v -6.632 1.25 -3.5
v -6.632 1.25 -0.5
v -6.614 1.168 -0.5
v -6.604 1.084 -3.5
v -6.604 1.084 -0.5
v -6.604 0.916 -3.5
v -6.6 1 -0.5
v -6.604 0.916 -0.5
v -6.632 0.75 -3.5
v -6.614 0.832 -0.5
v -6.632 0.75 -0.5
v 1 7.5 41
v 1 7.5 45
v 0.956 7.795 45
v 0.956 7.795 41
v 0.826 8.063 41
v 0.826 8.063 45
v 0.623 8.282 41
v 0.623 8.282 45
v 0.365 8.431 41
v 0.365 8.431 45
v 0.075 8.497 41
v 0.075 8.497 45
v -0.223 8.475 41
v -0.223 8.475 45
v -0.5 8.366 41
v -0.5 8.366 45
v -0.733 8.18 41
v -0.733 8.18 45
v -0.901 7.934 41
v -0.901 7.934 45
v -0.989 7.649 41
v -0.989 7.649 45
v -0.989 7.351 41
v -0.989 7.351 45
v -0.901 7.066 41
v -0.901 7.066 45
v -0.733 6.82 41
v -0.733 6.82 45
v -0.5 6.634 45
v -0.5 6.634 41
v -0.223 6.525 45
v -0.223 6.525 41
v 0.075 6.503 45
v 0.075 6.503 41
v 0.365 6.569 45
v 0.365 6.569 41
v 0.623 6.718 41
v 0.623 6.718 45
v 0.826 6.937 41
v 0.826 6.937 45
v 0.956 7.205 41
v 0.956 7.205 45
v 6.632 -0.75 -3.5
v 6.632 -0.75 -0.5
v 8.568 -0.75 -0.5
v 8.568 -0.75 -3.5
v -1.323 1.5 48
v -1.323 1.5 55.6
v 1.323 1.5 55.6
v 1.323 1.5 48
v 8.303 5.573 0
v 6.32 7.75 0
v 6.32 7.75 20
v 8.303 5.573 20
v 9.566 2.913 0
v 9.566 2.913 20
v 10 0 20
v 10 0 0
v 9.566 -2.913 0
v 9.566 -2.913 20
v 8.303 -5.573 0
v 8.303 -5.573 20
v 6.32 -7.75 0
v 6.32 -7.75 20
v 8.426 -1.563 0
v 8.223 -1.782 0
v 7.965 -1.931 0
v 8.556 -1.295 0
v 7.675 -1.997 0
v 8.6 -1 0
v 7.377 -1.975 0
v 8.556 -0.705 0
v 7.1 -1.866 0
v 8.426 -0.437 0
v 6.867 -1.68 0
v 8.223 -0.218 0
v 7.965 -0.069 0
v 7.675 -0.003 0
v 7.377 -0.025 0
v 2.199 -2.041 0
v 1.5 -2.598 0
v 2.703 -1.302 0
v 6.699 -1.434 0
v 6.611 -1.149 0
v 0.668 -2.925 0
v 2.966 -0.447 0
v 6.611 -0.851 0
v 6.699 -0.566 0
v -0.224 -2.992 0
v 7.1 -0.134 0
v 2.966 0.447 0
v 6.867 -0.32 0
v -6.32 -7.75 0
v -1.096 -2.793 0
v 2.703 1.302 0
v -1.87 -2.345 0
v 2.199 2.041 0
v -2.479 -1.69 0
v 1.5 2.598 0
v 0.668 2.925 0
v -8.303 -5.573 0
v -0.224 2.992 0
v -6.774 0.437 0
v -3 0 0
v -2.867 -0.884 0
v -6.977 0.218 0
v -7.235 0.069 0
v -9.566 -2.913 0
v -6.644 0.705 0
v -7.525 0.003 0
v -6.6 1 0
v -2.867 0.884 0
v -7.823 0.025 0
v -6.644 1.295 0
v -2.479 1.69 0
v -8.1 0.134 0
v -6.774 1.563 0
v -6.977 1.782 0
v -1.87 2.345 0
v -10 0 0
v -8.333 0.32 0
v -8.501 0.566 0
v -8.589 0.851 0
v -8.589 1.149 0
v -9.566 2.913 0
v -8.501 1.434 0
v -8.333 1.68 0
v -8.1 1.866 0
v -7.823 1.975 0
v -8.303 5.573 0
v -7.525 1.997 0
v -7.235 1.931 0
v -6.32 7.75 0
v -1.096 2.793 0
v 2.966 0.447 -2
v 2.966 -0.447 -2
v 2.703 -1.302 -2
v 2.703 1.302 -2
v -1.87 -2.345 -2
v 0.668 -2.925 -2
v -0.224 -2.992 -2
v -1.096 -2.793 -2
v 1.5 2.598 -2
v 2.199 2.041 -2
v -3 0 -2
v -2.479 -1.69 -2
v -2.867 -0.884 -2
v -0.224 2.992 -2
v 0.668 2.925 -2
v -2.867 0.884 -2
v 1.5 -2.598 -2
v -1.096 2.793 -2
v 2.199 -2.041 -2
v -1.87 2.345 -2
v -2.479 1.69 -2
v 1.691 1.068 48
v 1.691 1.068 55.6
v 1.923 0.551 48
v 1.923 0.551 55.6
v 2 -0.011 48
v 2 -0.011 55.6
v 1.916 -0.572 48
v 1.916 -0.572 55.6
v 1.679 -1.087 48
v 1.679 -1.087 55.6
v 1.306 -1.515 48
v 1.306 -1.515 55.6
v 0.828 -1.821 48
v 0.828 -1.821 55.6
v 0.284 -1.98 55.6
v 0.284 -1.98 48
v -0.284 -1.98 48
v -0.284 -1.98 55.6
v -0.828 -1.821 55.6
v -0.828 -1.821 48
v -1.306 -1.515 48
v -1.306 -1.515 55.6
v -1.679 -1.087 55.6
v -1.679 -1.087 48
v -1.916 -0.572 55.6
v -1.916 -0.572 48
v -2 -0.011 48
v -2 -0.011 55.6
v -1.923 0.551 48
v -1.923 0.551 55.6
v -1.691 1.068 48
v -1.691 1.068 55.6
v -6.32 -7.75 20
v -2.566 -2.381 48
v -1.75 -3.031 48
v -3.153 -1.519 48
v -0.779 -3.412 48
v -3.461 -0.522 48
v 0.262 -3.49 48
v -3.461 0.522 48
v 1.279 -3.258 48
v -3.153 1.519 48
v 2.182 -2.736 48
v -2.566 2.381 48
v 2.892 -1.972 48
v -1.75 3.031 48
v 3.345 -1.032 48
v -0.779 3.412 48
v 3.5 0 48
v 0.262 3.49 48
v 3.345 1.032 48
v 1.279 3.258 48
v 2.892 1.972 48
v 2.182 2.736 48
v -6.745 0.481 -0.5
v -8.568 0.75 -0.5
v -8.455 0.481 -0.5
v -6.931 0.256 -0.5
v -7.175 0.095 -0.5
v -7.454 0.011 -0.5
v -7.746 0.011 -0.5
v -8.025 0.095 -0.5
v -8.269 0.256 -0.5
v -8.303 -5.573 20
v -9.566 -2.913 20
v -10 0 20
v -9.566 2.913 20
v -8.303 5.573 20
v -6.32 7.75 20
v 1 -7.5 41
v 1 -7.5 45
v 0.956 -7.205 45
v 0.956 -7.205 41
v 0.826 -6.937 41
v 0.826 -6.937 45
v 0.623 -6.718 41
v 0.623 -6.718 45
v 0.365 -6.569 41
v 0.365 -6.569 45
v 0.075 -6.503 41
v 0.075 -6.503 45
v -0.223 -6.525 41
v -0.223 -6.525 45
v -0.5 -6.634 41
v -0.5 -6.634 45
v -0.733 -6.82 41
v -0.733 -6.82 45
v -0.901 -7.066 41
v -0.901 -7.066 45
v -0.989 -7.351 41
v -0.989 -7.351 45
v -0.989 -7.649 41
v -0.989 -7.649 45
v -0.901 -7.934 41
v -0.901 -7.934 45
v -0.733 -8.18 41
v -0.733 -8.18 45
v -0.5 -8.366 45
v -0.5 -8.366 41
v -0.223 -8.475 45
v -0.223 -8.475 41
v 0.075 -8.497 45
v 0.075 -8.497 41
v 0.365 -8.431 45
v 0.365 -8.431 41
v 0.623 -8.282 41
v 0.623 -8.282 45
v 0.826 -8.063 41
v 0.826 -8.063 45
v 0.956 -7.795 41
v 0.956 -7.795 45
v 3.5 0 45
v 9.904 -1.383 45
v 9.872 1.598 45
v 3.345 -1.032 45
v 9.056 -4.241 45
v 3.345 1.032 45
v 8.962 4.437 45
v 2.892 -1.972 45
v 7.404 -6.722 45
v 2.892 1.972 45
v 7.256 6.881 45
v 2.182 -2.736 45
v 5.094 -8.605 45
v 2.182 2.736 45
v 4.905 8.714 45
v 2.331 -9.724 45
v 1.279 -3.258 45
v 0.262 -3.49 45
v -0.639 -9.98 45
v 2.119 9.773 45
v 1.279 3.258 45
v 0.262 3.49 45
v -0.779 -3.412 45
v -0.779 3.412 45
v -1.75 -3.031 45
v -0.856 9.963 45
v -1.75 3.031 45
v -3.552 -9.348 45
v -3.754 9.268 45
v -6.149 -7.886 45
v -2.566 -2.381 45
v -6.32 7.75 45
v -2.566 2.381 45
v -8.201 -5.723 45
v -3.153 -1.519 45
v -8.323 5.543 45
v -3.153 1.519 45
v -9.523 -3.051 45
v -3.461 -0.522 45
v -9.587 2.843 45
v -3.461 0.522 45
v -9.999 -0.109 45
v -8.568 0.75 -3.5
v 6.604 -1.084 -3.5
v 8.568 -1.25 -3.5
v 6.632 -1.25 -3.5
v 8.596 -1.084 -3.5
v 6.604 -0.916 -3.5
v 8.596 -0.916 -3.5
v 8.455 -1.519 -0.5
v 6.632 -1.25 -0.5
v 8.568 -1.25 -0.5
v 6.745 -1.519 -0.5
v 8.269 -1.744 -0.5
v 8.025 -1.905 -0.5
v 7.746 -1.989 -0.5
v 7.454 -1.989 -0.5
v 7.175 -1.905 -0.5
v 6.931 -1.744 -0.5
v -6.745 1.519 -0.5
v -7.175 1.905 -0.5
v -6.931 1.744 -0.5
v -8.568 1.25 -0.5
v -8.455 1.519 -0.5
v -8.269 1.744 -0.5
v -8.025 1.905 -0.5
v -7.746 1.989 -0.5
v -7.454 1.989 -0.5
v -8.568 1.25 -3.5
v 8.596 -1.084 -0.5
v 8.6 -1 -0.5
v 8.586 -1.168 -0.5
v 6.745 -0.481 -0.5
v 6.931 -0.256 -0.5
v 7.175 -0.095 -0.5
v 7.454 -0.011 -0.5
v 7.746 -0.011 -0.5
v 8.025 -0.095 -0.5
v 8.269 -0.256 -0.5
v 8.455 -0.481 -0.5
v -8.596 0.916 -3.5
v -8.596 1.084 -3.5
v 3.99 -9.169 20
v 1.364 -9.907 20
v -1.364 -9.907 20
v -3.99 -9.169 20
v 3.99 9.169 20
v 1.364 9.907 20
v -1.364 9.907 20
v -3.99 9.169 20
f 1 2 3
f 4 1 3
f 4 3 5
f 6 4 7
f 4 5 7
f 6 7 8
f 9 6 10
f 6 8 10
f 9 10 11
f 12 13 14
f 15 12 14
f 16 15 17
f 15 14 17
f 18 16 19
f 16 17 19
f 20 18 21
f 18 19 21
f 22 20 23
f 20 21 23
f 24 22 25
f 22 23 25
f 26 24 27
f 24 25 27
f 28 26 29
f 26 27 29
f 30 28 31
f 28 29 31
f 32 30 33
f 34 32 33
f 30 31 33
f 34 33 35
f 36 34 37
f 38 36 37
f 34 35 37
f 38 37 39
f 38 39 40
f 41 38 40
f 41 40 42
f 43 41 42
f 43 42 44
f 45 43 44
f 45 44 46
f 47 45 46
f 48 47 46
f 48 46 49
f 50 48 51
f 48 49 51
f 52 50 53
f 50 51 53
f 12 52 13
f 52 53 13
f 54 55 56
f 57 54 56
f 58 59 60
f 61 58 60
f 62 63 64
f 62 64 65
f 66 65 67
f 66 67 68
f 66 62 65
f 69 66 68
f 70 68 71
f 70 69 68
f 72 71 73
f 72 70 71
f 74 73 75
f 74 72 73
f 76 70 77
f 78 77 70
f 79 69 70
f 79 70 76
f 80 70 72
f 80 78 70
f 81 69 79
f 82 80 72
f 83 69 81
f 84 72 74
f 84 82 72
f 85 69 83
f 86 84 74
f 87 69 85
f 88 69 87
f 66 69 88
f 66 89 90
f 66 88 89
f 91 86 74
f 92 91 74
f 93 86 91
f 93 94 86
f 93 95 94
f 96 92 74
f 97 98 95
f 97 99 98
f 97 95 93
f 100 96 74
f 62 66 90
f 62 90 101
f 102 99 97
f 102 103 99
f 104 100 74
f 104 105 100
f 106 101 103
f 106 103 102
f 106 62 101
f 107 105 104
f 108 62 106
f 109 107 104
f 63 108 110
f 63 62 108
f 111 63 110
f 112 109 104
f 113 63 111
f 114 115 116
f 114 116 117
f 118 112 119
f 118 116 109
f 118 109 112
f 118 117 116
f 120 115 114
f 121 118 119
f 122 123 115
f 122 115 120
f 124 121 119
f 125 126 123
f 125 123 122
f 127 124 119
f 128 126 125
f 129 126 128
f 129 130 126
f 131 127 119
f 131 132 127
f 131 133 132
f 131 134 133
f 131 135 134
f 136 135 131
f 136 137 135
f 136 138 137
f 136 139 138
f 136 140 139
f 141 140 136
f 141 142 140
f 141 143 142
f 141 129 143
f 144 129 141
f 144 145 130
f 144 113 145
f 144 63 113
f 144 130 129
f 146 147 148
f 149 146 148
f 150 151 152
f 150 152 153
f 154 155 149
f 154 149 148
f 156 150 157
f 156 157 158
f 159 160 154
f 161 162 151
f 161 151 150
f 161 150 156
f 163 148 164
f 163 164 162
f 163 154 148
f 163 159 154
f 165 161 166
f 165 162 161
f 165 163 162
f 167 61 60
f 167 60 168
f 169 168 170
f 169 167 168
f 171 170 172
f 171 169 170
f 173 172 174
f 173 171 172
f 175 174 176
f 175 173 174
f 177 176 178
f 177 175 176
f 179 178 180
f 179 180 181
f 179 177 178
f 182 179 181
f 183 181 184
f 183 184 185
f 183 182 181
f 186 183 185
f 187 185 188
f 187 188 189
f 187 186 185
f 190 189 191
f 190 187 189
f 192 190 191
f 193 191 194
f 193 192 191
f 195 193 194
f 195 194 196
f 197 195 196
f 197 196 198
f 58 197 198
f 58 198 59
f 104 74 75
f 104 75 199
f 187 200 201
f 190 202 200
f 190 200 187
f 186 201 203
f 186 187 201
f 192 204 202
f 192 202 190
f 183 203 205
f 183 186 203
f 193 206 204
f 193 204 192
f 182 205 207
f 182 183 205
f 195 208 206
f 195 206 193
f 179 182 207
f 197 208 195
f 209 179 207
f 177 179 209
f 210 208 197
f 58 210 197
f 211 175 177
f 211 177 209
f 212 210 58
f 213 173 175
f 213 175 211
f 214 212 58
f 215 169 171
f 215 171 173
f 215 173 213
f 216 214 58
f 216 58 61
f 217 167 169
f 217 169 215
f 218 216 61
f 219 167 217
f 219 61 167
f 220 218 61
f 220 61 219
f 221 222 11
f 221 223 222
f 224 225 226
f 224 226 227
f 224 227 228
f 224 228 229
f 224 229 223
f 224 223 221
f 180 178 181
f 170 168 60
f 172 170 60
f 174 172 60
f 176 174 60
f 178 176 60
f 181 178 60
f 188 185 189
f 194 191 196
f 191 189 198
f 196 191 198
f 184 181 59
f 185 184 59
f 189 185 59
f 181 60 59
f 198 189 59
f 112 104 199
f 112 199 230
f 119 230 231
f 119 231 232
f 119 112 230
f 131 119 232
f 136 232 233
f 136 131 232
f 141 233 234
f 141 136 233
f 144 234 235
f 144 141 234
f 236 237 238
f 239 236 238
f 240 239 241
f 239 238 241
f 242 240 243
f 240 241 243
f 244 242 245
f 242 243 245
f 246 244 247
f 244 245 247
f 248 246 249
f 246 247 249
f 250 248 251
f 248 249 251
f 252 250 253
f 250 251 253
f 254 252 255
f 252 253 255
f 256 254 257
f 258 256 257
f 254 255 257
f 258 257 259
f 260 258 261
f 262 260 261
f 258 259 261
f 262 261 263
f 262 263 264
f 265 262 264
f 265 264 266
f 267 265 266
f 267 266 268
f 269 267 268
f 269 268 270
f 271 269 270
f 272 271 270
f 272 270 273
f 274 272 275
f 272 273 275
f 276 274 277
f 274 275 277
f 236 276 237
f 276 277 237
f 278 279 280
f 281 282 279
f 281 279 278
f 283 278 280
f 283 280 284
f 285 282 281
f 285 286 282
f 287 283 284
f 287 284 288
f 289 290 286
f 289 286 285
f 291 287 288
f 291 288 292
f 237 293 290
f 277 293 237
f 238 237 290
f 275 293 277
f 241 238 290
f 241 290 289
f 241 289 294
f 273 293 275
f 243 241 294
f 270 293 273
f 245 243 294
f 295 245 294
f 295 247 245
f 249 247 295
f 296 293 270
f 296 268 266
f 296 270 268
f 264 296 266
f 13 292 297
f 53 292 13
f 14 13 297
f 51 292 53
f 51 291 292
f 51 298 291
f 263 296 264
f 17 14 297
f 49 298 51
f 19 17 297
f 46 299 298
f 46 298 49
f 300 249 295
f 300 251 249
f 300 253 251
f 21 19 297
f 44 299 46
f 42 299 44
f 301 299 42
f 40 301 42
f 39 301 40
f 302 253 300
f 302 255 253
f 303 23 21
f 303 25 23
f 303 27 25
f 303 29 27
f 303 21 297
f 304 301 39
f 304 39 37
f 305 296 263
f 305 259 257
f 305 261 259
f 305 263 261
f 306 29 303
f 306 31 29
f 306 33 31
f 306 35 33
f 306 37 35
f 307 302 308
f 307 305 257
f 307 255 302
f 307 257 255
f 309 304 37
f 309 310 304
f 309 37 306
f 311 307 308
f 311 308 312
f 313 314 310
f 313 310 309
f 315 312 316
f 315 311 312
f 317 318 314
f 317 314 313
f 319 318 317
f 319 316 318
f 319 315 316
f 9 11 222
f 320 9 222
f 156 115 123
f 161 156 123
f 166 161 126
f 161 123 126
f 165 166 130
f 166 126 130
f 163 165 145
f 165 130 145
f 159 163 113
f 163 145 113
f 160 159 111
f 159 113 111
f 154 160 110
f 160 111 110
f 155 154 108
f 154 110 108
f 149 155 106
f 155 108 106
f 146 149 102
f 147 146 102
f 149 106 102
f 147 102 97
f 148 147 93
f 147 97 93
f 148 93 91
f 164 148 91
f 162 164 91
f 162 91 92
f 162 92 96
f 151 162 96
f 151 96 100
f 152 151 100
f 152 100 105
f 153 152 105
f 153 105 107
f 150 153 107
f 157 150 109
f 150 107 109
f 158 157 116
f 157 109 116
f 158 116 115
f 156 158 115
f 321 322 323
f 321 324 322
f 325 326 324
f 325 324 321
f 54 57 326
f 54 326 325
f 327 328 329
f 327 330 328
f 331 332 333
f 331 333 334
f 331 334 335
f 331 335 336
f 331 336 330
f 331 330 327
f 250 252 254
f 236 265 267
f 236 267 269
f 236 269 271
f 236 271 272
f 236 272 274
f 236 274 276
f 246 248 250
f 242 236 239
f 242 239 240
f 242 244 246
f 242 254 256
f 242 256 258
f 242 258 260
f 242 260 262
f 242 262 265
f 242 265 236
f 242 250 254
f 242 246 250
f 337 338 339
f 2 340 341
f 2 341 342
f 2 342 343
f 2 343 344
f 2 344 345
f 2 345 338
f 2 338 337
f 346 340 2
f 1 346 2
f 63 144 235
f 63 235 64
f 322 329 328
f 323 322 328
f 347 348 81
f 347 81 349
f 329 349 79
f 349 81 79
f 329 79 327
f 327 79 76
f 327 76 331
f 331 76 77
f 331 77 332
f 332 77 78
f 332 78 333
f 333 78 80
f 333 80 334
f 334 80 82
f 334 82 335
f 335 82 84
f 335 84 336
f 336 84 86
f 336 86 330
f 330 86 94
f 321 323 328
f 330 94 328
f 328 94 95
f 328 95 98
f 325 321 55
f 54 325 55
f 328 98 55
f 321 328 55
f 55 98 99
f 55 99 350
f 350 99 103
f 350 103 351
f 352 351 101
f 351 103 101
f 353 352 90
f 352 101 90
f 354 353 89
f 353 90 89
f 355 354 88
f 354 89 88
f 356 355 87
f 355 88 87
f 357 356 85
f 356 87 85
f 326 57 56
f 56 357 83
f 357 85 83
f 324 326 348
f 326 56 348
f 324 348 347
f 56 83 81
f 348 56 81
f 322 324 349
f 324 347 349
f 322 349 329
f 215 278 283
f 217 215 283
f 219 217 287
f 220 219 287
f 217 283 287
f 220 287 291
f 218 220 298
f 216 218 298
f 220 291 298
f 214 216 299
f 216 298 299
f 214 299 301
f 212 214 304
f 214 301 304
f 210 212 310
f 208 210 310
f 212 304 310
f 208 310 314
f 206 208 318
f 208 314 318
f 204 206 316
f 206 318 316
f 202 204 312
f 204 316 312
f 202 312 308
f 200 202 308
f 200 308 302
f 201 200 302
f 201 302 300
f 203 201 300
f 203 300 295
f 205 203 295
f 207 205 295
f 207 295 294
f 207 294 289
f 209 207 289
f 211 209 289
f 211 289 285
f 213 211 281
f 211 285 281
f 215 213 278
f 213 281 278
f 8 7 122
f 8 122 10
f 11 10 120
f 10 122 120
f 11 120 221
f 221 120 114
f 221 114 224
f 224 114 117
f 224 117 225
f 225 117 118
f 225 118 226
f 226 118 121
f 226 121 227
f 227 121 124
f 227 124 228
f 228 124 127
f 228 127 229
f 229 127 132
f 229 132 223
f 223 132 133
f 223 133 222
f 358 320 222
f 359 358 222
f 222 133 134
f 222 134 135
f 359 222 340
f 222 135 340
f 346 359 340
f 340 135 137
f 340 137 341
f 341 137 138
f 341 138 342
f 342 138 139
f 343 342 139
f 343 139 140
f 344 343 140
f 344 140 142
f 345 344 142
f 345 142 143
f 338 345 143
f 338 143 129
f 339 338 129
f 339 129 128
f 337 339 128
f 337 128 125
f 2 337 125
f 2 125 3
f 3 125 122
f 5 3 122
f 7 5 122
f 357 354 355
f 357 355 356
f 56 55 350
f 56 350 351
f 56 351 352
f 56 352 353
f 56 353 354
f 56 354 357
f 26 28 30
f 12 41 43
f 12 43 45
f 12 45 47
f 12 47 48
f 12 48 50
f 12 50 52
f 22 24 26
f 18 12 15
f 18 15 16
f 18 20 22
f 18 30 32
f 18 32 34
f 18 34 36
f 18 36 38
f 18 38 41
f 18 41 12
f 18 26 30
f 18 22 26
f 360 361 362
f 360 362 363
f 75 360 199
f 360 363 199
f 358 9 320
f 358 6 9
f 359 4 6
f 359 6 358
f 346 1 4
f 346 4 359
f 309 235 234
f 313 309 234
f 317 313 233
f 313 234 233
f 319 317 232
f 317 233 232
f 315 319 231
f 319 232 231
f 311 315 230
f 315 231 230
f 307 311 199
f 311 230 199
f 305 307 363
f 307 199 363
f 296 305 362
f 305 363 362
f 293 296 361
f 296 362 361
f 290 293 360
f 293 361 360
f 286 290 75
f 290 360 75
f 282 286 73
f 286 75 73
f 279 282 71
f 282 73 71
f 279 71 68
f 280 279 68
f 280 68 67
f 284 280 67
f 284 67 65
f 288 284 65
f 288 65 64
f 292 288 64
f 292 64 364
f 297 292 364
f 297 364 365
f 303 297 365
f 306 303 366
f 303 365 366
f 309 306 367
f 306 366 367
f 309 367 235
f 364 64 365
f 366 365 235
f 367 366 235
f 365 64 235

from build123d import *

# Parameters (mm, degrees)
EXTRUDE_1_DEPTH     = 20
SKETCH_2_R          = 10
EXTRUDE_2_DEPTH     = 25
SKETCH_3_R          = 1
CUT_EXTRUDE_1_DEPTH = 4
SKETCH_4_R          = 3
EXTRUDE_3_DEPTH     = 2
SKETCH_5_R          = 1
EXTRUDE_4_DEPTH     = 0.5
EXTRUDE_6_DEPTH     = 3
SKETCH_7_R          = 3.5
EXTRUDE_7_DEPTH     = 3
EXTRUDE_8_DEPTH     = 7.6


with BuildPart() as part:
    # 草图1 → 凸台-拉伸1 (new body)
    with BuildSketch(Plane.XY):
        with BuildLine():
            Line((-6.31961233, 7.75), (6.31961233, 7.75))
            ThreePointArc((6.31961233, 7.75), (10, 0), (6.31961233, -7.75))
            Line((6.31961233, -7.75), (-6.31961233, -7.75))
            ThreePointArc((-6.31961233, -7.75), (-10, 0), (-6.31961233, 7.75))
        make_face()
    extrude(amount=EXTRUDE_1_DEPTH)

    # 草图2 → 凸台-拉伸2 (add)
    with BuildSketch(Plane.XY.offset(20)):
        with Locations(Location((0, 0, 0), (0, 0, 129.194967426))):
            Circle(SKETCH_2_R)
    extrude(amount=EXTRUDE_2_DEPTH)

    # 草图3 → 切除-拉伸1 (cut)
    with BuildSketch(Plane.XY.offset(45)):
        with Locations((0, 7.5)):
            Circle(SKETCH_3_R)
        with Locations((0, -7.5)):
            Circle(SKETCH_3_R)
    extrude(amount=-CUT_EXTRUDE_1_DEPTH, mode=Mode.SUBTRACT)

    # 草图4 → 凸台-拉伸3 (add)
    with BuildSketch(Plane(origin=(0, 0, 0), x_dir=(-1, 0, 0), z_dir=(0, 0, -1))):
        Circle(SKETCH_4_R)
    extrude(amount=EXTRUDE_3_DEPTH)

    # 草图5 → 凸台-拉伸4 (add)
    with BuildSketch(Plane(origin=(0, 0, 0), x_dir=(-1, 0, 0), z_dir=(0, 0, -1))):
        with Locations(Location((-7.6, -1, 0), (0, 0, 180))):
            Circle(SKETCH_5_R)
        with Locations(Location((7.6, 1, 0), (0, 0, 180))):
            Circle(SKETCH_5_R)
    extrude(amount=EXTRUDE_4_DEPTH)

    # 草图6 → 凸台-拉伸6 (add)
    with BuildSketch(Plane(origin=(0, 0, -0.5), x_dir=(-1, 0, 0), z_dir=(0, 0, -1))):
        with BuildLine():
            Line((-8.568245837, -1.25), (-6.631754163, -1.25))
            ThreePointArc((-6.631754163, -1.25), (-6.6, -1), (-6.631754163, -0.75))
            Line((-6.631754163, -0.75), (-8.568245837, -0.75))
            ThreePointArc((-8.568245837, -0.75), (-8.6, -1), (-8.568245837, -1.25))
        make_face()
        with BuildLine():
            Line((6.631754163, 0.75), (8.568245837, 0.75))
            ThreePointArc((8.568245837, 0.75), (8.6, 1), (8.568245837, 1.25))
            Line((8.568245837, 1.25), (6.631754163, 1.25))
            ThreePointArc((6.631754163, 1.25), (6.6, 1), (6.631754163, 0.75))
        make_face()
    extrude(amount=EXTRUDE_6_DEPTH)

    # 草图7 → 凸台-拉伸7 (add)
    with BuildSketch(Plane.XY.offset(45)):
        Circle(SKETCH_7_R)
    extrude(amount=EXTRUDE_7_DEPTH)

    # 草图9 → 凸台-拉伸8 (add)
    with BuildSketch(Plane.XY.offset(48)):
        with BuildLine():
            Line((-1.322875656, 1.5), (1.322875656, 1.5))
            ThreePointArc((1.322875656, 1.5), (0, -2), (-1.322875656, 1.5))
        make_face()
    extrude(amount=EXTRUDE_8_DEPTH)


solid = part.part
